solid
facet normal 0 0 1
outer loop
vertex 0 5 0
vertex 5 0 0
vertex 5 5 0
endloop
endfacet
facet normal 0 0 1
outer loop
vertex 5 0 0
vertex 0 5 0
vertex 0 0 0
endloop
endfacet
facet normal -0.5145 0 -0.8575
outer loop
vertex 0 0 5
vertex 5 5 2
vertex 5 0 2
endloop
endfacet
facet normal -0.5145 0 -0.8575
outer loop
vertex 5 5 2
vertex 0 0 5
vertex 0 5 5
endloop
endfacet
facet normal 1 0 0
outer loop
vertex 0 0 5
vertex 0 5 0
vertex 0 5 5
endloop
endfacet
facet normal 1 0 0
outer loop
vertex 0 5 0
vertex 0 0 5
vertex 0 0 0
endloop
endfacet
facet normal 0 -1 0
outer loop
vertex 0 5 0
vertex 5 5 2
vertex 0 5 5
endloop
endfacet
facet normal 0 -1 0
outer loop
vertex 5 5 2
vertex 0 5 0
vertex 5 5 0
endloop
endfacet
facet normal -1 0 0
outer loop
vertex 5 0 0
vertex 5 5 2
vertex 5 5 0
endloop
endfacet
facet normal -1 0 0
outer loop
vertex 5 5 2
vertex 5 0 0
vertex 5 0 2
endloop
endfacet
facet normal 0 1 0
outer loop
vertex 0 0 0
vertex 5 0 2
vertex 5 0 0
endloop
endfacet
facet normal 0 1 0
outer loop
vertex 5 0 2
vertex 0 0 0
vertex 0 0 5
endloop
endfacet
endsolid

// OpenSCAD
resolution_factor = 1.00;

aby = 5;
abx = 5;
aty = 5;
atx = 2;

module poly_square(by, bx, ty, tx)
{
    polyhedron(
       points=[
                //Buttom Points
              [ 0, 0, 0 ],  //0
              [ 0, by, 0 ],  //1
              [ bx, by, 0 ],  //2
              [ bx, 0, 0 ],  //3
                //Top Points1
              [ 0, 0, ty ],  //4
              [ 0, by, ty ],  //5
              [ bx, by, tx ],  //6
              [ bx, 0, tx ]], //7
        faces=[
              [0,1,2,3],  // bottom
              [7,6,5,4],  // top
              [4,5,1,0],  // x0
              [5,6,2,1],  // parax
              [6,7,3,2],  // paray
              [7,4,0,3]] // y0
    );    
}

poly_square(aby, abx, aty, atx);

/*
    polyhedron(
        points=[
            [10, 0, 0],  //0
            [0, 10, 0],  //1
            [-10, 0, 0],  //2
            [0, -10, 0],  //3
            [0, 0, 10]],  //4
        faces=[
            [0, 1, 2, 3],
            [4, 1, 0],
            [4, 2, 1],
            [4, 3, 2],
            [4, 0, 3]]    
    );    
*/
